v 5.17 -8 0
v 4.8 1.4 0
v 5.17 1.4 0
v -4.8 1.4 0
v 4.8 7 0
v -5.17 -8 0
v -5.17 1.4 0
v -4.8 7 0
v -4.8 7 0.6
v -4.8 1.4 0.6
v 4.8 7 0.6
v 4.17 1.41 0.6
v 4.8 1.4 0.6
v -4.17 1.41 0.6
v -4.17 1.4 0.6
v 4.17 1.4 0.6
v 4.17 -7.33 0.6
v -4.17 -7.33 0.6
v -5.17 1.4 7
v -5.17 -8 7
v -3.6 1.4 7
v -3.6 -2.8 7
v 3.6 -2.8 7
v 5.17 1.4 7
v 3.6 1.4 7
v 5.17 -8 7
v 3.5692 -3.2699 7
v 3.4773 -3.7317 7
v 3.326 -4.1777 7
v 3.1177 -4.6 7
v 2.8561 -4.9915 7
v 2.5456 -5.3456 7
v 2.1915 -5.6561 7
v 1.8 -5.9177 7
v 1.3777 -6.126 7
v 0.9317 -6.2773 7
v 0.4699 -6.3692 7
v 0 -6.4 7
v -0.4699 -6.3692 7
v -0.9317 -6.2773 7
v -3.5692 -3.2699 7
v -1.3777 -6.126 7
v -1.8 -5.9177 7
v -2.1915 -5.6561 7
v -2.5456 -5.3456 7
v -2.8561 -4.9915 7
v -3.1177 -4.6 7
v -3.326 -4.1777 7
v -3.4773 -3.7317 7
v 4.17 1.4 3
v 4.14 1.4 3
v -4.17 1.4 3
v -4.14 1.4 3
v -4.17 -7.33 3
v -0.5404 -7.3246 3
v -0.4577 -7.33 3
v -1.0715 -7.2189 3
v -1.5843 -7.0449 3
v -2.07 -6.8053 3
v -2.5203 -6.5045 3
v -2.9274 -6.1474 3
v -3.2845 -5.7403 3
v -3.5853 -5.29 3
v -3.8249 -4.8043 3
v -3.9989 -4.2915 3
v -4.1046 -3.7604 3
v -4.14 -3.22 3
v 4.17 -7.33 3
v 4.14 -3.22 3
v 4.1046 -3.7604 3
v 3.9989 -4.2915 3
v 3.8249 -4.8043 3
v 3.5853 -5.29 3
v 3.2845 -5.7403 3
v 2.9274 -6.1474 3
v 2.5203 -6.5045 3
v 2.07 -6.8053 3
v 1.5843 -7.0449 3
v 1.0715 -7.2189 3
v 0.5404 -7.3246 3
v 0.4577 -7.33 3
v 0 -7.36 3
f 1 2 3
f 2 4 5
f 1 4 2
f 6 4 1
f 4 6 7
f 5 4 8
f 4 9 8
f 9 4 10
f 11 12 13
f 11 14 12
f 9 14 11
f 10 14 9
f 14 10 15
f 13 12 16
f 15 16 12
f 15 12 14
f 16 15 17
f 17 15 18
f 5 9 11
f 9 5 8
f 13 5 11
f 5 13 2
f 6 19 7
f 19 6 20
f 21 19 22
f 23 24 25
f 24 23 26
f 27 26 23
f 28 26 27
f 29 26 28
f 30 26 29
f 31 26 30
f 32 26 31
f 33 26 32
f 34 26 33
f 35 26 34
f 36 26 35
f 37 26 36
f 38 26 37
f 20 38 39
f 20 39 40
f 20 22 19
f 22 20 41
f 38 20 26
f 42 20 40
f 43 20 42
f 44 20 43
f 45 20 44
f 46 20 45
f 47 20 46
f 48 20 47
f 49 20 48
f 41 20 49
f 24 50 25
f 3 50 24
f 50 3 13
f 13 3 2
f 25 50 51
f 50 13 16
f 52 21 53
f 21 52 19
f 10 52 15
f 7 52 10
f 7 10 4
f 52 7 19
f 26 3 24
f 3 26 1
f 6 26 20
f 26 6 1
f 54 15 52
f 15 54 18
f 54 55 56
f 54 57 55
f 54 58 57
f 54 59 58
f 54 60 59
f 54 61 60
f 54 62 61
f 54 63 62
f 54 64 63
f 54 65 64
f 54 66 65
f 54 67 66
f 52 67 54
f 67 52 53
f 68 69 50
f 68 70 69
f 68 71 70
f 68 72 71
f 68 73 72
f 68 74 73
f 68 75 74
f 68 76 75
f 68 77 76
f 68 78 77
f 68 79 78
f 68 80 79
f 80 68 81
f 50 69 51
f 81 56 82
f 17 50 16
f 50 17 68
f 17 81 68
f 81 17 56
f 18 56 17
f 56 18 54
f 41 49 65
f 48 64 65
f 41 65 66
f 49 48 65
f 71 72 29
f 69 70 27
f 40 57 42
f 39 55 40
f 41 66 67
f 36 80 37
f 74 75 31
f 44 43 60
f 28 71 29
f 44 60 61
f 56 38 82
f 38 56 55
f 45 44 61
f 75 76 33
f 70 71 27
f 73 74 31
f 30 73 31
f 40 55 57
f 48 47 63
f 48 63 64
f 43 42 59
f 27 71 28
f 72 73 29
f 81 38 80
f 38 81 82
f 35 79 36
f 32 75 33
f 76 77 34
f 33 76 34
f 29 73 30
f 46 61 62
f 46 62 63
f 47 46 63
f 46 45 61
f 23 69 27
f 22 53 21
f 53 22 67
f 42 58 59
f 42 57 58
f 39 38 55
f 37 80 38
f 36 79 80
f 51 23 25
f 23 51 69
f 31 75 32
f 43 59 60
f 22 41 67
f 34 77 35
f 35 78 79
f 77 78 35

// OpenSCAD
// MiP camera insert/protector

$fn = 48;

insert_wid = 9.6;
insert_len = 14.0;
base_thick = 0.6;
cam_h = 2.1+0.3;
bezel_wall_thick = 4.0;
side_wall_thick = 1.0;
cam_dia = 7.2;
cam_wid = 8.34;
insert_dist = 5.6;

difference() {
    union() {
        linear_extrude(base_thick)
        square([insert_wid, insert_len], center=true);
        translate([0,-insert_dist/2-side_wall_thick/2,0])
        linear_extrude(base_thick+cam_h+bezel_wall_thick)
        square([cam_wid+side_wall_thick*2, insert_len-insert_dist+side_wall_thick], center=true);
    }
    translate([0,-insert_dist/2+0.04-0.2,base_thick])
    linear_extrude(cam_h)
    square([cam_wid, cam_wid+0.4], center=true);
    translate([0,0,bezel_wall_thick+base_thick+cam_h])
    mirror([0,0,1])
    linear_extrude(bezel_wall_thick, scale=1.15)
    hull() {
        translate([0,-insert_dist/2])
        circle(d=cam_dia);
        translate([0,insert_dist/2])
        circle(d=cam_dia);
    }
}
